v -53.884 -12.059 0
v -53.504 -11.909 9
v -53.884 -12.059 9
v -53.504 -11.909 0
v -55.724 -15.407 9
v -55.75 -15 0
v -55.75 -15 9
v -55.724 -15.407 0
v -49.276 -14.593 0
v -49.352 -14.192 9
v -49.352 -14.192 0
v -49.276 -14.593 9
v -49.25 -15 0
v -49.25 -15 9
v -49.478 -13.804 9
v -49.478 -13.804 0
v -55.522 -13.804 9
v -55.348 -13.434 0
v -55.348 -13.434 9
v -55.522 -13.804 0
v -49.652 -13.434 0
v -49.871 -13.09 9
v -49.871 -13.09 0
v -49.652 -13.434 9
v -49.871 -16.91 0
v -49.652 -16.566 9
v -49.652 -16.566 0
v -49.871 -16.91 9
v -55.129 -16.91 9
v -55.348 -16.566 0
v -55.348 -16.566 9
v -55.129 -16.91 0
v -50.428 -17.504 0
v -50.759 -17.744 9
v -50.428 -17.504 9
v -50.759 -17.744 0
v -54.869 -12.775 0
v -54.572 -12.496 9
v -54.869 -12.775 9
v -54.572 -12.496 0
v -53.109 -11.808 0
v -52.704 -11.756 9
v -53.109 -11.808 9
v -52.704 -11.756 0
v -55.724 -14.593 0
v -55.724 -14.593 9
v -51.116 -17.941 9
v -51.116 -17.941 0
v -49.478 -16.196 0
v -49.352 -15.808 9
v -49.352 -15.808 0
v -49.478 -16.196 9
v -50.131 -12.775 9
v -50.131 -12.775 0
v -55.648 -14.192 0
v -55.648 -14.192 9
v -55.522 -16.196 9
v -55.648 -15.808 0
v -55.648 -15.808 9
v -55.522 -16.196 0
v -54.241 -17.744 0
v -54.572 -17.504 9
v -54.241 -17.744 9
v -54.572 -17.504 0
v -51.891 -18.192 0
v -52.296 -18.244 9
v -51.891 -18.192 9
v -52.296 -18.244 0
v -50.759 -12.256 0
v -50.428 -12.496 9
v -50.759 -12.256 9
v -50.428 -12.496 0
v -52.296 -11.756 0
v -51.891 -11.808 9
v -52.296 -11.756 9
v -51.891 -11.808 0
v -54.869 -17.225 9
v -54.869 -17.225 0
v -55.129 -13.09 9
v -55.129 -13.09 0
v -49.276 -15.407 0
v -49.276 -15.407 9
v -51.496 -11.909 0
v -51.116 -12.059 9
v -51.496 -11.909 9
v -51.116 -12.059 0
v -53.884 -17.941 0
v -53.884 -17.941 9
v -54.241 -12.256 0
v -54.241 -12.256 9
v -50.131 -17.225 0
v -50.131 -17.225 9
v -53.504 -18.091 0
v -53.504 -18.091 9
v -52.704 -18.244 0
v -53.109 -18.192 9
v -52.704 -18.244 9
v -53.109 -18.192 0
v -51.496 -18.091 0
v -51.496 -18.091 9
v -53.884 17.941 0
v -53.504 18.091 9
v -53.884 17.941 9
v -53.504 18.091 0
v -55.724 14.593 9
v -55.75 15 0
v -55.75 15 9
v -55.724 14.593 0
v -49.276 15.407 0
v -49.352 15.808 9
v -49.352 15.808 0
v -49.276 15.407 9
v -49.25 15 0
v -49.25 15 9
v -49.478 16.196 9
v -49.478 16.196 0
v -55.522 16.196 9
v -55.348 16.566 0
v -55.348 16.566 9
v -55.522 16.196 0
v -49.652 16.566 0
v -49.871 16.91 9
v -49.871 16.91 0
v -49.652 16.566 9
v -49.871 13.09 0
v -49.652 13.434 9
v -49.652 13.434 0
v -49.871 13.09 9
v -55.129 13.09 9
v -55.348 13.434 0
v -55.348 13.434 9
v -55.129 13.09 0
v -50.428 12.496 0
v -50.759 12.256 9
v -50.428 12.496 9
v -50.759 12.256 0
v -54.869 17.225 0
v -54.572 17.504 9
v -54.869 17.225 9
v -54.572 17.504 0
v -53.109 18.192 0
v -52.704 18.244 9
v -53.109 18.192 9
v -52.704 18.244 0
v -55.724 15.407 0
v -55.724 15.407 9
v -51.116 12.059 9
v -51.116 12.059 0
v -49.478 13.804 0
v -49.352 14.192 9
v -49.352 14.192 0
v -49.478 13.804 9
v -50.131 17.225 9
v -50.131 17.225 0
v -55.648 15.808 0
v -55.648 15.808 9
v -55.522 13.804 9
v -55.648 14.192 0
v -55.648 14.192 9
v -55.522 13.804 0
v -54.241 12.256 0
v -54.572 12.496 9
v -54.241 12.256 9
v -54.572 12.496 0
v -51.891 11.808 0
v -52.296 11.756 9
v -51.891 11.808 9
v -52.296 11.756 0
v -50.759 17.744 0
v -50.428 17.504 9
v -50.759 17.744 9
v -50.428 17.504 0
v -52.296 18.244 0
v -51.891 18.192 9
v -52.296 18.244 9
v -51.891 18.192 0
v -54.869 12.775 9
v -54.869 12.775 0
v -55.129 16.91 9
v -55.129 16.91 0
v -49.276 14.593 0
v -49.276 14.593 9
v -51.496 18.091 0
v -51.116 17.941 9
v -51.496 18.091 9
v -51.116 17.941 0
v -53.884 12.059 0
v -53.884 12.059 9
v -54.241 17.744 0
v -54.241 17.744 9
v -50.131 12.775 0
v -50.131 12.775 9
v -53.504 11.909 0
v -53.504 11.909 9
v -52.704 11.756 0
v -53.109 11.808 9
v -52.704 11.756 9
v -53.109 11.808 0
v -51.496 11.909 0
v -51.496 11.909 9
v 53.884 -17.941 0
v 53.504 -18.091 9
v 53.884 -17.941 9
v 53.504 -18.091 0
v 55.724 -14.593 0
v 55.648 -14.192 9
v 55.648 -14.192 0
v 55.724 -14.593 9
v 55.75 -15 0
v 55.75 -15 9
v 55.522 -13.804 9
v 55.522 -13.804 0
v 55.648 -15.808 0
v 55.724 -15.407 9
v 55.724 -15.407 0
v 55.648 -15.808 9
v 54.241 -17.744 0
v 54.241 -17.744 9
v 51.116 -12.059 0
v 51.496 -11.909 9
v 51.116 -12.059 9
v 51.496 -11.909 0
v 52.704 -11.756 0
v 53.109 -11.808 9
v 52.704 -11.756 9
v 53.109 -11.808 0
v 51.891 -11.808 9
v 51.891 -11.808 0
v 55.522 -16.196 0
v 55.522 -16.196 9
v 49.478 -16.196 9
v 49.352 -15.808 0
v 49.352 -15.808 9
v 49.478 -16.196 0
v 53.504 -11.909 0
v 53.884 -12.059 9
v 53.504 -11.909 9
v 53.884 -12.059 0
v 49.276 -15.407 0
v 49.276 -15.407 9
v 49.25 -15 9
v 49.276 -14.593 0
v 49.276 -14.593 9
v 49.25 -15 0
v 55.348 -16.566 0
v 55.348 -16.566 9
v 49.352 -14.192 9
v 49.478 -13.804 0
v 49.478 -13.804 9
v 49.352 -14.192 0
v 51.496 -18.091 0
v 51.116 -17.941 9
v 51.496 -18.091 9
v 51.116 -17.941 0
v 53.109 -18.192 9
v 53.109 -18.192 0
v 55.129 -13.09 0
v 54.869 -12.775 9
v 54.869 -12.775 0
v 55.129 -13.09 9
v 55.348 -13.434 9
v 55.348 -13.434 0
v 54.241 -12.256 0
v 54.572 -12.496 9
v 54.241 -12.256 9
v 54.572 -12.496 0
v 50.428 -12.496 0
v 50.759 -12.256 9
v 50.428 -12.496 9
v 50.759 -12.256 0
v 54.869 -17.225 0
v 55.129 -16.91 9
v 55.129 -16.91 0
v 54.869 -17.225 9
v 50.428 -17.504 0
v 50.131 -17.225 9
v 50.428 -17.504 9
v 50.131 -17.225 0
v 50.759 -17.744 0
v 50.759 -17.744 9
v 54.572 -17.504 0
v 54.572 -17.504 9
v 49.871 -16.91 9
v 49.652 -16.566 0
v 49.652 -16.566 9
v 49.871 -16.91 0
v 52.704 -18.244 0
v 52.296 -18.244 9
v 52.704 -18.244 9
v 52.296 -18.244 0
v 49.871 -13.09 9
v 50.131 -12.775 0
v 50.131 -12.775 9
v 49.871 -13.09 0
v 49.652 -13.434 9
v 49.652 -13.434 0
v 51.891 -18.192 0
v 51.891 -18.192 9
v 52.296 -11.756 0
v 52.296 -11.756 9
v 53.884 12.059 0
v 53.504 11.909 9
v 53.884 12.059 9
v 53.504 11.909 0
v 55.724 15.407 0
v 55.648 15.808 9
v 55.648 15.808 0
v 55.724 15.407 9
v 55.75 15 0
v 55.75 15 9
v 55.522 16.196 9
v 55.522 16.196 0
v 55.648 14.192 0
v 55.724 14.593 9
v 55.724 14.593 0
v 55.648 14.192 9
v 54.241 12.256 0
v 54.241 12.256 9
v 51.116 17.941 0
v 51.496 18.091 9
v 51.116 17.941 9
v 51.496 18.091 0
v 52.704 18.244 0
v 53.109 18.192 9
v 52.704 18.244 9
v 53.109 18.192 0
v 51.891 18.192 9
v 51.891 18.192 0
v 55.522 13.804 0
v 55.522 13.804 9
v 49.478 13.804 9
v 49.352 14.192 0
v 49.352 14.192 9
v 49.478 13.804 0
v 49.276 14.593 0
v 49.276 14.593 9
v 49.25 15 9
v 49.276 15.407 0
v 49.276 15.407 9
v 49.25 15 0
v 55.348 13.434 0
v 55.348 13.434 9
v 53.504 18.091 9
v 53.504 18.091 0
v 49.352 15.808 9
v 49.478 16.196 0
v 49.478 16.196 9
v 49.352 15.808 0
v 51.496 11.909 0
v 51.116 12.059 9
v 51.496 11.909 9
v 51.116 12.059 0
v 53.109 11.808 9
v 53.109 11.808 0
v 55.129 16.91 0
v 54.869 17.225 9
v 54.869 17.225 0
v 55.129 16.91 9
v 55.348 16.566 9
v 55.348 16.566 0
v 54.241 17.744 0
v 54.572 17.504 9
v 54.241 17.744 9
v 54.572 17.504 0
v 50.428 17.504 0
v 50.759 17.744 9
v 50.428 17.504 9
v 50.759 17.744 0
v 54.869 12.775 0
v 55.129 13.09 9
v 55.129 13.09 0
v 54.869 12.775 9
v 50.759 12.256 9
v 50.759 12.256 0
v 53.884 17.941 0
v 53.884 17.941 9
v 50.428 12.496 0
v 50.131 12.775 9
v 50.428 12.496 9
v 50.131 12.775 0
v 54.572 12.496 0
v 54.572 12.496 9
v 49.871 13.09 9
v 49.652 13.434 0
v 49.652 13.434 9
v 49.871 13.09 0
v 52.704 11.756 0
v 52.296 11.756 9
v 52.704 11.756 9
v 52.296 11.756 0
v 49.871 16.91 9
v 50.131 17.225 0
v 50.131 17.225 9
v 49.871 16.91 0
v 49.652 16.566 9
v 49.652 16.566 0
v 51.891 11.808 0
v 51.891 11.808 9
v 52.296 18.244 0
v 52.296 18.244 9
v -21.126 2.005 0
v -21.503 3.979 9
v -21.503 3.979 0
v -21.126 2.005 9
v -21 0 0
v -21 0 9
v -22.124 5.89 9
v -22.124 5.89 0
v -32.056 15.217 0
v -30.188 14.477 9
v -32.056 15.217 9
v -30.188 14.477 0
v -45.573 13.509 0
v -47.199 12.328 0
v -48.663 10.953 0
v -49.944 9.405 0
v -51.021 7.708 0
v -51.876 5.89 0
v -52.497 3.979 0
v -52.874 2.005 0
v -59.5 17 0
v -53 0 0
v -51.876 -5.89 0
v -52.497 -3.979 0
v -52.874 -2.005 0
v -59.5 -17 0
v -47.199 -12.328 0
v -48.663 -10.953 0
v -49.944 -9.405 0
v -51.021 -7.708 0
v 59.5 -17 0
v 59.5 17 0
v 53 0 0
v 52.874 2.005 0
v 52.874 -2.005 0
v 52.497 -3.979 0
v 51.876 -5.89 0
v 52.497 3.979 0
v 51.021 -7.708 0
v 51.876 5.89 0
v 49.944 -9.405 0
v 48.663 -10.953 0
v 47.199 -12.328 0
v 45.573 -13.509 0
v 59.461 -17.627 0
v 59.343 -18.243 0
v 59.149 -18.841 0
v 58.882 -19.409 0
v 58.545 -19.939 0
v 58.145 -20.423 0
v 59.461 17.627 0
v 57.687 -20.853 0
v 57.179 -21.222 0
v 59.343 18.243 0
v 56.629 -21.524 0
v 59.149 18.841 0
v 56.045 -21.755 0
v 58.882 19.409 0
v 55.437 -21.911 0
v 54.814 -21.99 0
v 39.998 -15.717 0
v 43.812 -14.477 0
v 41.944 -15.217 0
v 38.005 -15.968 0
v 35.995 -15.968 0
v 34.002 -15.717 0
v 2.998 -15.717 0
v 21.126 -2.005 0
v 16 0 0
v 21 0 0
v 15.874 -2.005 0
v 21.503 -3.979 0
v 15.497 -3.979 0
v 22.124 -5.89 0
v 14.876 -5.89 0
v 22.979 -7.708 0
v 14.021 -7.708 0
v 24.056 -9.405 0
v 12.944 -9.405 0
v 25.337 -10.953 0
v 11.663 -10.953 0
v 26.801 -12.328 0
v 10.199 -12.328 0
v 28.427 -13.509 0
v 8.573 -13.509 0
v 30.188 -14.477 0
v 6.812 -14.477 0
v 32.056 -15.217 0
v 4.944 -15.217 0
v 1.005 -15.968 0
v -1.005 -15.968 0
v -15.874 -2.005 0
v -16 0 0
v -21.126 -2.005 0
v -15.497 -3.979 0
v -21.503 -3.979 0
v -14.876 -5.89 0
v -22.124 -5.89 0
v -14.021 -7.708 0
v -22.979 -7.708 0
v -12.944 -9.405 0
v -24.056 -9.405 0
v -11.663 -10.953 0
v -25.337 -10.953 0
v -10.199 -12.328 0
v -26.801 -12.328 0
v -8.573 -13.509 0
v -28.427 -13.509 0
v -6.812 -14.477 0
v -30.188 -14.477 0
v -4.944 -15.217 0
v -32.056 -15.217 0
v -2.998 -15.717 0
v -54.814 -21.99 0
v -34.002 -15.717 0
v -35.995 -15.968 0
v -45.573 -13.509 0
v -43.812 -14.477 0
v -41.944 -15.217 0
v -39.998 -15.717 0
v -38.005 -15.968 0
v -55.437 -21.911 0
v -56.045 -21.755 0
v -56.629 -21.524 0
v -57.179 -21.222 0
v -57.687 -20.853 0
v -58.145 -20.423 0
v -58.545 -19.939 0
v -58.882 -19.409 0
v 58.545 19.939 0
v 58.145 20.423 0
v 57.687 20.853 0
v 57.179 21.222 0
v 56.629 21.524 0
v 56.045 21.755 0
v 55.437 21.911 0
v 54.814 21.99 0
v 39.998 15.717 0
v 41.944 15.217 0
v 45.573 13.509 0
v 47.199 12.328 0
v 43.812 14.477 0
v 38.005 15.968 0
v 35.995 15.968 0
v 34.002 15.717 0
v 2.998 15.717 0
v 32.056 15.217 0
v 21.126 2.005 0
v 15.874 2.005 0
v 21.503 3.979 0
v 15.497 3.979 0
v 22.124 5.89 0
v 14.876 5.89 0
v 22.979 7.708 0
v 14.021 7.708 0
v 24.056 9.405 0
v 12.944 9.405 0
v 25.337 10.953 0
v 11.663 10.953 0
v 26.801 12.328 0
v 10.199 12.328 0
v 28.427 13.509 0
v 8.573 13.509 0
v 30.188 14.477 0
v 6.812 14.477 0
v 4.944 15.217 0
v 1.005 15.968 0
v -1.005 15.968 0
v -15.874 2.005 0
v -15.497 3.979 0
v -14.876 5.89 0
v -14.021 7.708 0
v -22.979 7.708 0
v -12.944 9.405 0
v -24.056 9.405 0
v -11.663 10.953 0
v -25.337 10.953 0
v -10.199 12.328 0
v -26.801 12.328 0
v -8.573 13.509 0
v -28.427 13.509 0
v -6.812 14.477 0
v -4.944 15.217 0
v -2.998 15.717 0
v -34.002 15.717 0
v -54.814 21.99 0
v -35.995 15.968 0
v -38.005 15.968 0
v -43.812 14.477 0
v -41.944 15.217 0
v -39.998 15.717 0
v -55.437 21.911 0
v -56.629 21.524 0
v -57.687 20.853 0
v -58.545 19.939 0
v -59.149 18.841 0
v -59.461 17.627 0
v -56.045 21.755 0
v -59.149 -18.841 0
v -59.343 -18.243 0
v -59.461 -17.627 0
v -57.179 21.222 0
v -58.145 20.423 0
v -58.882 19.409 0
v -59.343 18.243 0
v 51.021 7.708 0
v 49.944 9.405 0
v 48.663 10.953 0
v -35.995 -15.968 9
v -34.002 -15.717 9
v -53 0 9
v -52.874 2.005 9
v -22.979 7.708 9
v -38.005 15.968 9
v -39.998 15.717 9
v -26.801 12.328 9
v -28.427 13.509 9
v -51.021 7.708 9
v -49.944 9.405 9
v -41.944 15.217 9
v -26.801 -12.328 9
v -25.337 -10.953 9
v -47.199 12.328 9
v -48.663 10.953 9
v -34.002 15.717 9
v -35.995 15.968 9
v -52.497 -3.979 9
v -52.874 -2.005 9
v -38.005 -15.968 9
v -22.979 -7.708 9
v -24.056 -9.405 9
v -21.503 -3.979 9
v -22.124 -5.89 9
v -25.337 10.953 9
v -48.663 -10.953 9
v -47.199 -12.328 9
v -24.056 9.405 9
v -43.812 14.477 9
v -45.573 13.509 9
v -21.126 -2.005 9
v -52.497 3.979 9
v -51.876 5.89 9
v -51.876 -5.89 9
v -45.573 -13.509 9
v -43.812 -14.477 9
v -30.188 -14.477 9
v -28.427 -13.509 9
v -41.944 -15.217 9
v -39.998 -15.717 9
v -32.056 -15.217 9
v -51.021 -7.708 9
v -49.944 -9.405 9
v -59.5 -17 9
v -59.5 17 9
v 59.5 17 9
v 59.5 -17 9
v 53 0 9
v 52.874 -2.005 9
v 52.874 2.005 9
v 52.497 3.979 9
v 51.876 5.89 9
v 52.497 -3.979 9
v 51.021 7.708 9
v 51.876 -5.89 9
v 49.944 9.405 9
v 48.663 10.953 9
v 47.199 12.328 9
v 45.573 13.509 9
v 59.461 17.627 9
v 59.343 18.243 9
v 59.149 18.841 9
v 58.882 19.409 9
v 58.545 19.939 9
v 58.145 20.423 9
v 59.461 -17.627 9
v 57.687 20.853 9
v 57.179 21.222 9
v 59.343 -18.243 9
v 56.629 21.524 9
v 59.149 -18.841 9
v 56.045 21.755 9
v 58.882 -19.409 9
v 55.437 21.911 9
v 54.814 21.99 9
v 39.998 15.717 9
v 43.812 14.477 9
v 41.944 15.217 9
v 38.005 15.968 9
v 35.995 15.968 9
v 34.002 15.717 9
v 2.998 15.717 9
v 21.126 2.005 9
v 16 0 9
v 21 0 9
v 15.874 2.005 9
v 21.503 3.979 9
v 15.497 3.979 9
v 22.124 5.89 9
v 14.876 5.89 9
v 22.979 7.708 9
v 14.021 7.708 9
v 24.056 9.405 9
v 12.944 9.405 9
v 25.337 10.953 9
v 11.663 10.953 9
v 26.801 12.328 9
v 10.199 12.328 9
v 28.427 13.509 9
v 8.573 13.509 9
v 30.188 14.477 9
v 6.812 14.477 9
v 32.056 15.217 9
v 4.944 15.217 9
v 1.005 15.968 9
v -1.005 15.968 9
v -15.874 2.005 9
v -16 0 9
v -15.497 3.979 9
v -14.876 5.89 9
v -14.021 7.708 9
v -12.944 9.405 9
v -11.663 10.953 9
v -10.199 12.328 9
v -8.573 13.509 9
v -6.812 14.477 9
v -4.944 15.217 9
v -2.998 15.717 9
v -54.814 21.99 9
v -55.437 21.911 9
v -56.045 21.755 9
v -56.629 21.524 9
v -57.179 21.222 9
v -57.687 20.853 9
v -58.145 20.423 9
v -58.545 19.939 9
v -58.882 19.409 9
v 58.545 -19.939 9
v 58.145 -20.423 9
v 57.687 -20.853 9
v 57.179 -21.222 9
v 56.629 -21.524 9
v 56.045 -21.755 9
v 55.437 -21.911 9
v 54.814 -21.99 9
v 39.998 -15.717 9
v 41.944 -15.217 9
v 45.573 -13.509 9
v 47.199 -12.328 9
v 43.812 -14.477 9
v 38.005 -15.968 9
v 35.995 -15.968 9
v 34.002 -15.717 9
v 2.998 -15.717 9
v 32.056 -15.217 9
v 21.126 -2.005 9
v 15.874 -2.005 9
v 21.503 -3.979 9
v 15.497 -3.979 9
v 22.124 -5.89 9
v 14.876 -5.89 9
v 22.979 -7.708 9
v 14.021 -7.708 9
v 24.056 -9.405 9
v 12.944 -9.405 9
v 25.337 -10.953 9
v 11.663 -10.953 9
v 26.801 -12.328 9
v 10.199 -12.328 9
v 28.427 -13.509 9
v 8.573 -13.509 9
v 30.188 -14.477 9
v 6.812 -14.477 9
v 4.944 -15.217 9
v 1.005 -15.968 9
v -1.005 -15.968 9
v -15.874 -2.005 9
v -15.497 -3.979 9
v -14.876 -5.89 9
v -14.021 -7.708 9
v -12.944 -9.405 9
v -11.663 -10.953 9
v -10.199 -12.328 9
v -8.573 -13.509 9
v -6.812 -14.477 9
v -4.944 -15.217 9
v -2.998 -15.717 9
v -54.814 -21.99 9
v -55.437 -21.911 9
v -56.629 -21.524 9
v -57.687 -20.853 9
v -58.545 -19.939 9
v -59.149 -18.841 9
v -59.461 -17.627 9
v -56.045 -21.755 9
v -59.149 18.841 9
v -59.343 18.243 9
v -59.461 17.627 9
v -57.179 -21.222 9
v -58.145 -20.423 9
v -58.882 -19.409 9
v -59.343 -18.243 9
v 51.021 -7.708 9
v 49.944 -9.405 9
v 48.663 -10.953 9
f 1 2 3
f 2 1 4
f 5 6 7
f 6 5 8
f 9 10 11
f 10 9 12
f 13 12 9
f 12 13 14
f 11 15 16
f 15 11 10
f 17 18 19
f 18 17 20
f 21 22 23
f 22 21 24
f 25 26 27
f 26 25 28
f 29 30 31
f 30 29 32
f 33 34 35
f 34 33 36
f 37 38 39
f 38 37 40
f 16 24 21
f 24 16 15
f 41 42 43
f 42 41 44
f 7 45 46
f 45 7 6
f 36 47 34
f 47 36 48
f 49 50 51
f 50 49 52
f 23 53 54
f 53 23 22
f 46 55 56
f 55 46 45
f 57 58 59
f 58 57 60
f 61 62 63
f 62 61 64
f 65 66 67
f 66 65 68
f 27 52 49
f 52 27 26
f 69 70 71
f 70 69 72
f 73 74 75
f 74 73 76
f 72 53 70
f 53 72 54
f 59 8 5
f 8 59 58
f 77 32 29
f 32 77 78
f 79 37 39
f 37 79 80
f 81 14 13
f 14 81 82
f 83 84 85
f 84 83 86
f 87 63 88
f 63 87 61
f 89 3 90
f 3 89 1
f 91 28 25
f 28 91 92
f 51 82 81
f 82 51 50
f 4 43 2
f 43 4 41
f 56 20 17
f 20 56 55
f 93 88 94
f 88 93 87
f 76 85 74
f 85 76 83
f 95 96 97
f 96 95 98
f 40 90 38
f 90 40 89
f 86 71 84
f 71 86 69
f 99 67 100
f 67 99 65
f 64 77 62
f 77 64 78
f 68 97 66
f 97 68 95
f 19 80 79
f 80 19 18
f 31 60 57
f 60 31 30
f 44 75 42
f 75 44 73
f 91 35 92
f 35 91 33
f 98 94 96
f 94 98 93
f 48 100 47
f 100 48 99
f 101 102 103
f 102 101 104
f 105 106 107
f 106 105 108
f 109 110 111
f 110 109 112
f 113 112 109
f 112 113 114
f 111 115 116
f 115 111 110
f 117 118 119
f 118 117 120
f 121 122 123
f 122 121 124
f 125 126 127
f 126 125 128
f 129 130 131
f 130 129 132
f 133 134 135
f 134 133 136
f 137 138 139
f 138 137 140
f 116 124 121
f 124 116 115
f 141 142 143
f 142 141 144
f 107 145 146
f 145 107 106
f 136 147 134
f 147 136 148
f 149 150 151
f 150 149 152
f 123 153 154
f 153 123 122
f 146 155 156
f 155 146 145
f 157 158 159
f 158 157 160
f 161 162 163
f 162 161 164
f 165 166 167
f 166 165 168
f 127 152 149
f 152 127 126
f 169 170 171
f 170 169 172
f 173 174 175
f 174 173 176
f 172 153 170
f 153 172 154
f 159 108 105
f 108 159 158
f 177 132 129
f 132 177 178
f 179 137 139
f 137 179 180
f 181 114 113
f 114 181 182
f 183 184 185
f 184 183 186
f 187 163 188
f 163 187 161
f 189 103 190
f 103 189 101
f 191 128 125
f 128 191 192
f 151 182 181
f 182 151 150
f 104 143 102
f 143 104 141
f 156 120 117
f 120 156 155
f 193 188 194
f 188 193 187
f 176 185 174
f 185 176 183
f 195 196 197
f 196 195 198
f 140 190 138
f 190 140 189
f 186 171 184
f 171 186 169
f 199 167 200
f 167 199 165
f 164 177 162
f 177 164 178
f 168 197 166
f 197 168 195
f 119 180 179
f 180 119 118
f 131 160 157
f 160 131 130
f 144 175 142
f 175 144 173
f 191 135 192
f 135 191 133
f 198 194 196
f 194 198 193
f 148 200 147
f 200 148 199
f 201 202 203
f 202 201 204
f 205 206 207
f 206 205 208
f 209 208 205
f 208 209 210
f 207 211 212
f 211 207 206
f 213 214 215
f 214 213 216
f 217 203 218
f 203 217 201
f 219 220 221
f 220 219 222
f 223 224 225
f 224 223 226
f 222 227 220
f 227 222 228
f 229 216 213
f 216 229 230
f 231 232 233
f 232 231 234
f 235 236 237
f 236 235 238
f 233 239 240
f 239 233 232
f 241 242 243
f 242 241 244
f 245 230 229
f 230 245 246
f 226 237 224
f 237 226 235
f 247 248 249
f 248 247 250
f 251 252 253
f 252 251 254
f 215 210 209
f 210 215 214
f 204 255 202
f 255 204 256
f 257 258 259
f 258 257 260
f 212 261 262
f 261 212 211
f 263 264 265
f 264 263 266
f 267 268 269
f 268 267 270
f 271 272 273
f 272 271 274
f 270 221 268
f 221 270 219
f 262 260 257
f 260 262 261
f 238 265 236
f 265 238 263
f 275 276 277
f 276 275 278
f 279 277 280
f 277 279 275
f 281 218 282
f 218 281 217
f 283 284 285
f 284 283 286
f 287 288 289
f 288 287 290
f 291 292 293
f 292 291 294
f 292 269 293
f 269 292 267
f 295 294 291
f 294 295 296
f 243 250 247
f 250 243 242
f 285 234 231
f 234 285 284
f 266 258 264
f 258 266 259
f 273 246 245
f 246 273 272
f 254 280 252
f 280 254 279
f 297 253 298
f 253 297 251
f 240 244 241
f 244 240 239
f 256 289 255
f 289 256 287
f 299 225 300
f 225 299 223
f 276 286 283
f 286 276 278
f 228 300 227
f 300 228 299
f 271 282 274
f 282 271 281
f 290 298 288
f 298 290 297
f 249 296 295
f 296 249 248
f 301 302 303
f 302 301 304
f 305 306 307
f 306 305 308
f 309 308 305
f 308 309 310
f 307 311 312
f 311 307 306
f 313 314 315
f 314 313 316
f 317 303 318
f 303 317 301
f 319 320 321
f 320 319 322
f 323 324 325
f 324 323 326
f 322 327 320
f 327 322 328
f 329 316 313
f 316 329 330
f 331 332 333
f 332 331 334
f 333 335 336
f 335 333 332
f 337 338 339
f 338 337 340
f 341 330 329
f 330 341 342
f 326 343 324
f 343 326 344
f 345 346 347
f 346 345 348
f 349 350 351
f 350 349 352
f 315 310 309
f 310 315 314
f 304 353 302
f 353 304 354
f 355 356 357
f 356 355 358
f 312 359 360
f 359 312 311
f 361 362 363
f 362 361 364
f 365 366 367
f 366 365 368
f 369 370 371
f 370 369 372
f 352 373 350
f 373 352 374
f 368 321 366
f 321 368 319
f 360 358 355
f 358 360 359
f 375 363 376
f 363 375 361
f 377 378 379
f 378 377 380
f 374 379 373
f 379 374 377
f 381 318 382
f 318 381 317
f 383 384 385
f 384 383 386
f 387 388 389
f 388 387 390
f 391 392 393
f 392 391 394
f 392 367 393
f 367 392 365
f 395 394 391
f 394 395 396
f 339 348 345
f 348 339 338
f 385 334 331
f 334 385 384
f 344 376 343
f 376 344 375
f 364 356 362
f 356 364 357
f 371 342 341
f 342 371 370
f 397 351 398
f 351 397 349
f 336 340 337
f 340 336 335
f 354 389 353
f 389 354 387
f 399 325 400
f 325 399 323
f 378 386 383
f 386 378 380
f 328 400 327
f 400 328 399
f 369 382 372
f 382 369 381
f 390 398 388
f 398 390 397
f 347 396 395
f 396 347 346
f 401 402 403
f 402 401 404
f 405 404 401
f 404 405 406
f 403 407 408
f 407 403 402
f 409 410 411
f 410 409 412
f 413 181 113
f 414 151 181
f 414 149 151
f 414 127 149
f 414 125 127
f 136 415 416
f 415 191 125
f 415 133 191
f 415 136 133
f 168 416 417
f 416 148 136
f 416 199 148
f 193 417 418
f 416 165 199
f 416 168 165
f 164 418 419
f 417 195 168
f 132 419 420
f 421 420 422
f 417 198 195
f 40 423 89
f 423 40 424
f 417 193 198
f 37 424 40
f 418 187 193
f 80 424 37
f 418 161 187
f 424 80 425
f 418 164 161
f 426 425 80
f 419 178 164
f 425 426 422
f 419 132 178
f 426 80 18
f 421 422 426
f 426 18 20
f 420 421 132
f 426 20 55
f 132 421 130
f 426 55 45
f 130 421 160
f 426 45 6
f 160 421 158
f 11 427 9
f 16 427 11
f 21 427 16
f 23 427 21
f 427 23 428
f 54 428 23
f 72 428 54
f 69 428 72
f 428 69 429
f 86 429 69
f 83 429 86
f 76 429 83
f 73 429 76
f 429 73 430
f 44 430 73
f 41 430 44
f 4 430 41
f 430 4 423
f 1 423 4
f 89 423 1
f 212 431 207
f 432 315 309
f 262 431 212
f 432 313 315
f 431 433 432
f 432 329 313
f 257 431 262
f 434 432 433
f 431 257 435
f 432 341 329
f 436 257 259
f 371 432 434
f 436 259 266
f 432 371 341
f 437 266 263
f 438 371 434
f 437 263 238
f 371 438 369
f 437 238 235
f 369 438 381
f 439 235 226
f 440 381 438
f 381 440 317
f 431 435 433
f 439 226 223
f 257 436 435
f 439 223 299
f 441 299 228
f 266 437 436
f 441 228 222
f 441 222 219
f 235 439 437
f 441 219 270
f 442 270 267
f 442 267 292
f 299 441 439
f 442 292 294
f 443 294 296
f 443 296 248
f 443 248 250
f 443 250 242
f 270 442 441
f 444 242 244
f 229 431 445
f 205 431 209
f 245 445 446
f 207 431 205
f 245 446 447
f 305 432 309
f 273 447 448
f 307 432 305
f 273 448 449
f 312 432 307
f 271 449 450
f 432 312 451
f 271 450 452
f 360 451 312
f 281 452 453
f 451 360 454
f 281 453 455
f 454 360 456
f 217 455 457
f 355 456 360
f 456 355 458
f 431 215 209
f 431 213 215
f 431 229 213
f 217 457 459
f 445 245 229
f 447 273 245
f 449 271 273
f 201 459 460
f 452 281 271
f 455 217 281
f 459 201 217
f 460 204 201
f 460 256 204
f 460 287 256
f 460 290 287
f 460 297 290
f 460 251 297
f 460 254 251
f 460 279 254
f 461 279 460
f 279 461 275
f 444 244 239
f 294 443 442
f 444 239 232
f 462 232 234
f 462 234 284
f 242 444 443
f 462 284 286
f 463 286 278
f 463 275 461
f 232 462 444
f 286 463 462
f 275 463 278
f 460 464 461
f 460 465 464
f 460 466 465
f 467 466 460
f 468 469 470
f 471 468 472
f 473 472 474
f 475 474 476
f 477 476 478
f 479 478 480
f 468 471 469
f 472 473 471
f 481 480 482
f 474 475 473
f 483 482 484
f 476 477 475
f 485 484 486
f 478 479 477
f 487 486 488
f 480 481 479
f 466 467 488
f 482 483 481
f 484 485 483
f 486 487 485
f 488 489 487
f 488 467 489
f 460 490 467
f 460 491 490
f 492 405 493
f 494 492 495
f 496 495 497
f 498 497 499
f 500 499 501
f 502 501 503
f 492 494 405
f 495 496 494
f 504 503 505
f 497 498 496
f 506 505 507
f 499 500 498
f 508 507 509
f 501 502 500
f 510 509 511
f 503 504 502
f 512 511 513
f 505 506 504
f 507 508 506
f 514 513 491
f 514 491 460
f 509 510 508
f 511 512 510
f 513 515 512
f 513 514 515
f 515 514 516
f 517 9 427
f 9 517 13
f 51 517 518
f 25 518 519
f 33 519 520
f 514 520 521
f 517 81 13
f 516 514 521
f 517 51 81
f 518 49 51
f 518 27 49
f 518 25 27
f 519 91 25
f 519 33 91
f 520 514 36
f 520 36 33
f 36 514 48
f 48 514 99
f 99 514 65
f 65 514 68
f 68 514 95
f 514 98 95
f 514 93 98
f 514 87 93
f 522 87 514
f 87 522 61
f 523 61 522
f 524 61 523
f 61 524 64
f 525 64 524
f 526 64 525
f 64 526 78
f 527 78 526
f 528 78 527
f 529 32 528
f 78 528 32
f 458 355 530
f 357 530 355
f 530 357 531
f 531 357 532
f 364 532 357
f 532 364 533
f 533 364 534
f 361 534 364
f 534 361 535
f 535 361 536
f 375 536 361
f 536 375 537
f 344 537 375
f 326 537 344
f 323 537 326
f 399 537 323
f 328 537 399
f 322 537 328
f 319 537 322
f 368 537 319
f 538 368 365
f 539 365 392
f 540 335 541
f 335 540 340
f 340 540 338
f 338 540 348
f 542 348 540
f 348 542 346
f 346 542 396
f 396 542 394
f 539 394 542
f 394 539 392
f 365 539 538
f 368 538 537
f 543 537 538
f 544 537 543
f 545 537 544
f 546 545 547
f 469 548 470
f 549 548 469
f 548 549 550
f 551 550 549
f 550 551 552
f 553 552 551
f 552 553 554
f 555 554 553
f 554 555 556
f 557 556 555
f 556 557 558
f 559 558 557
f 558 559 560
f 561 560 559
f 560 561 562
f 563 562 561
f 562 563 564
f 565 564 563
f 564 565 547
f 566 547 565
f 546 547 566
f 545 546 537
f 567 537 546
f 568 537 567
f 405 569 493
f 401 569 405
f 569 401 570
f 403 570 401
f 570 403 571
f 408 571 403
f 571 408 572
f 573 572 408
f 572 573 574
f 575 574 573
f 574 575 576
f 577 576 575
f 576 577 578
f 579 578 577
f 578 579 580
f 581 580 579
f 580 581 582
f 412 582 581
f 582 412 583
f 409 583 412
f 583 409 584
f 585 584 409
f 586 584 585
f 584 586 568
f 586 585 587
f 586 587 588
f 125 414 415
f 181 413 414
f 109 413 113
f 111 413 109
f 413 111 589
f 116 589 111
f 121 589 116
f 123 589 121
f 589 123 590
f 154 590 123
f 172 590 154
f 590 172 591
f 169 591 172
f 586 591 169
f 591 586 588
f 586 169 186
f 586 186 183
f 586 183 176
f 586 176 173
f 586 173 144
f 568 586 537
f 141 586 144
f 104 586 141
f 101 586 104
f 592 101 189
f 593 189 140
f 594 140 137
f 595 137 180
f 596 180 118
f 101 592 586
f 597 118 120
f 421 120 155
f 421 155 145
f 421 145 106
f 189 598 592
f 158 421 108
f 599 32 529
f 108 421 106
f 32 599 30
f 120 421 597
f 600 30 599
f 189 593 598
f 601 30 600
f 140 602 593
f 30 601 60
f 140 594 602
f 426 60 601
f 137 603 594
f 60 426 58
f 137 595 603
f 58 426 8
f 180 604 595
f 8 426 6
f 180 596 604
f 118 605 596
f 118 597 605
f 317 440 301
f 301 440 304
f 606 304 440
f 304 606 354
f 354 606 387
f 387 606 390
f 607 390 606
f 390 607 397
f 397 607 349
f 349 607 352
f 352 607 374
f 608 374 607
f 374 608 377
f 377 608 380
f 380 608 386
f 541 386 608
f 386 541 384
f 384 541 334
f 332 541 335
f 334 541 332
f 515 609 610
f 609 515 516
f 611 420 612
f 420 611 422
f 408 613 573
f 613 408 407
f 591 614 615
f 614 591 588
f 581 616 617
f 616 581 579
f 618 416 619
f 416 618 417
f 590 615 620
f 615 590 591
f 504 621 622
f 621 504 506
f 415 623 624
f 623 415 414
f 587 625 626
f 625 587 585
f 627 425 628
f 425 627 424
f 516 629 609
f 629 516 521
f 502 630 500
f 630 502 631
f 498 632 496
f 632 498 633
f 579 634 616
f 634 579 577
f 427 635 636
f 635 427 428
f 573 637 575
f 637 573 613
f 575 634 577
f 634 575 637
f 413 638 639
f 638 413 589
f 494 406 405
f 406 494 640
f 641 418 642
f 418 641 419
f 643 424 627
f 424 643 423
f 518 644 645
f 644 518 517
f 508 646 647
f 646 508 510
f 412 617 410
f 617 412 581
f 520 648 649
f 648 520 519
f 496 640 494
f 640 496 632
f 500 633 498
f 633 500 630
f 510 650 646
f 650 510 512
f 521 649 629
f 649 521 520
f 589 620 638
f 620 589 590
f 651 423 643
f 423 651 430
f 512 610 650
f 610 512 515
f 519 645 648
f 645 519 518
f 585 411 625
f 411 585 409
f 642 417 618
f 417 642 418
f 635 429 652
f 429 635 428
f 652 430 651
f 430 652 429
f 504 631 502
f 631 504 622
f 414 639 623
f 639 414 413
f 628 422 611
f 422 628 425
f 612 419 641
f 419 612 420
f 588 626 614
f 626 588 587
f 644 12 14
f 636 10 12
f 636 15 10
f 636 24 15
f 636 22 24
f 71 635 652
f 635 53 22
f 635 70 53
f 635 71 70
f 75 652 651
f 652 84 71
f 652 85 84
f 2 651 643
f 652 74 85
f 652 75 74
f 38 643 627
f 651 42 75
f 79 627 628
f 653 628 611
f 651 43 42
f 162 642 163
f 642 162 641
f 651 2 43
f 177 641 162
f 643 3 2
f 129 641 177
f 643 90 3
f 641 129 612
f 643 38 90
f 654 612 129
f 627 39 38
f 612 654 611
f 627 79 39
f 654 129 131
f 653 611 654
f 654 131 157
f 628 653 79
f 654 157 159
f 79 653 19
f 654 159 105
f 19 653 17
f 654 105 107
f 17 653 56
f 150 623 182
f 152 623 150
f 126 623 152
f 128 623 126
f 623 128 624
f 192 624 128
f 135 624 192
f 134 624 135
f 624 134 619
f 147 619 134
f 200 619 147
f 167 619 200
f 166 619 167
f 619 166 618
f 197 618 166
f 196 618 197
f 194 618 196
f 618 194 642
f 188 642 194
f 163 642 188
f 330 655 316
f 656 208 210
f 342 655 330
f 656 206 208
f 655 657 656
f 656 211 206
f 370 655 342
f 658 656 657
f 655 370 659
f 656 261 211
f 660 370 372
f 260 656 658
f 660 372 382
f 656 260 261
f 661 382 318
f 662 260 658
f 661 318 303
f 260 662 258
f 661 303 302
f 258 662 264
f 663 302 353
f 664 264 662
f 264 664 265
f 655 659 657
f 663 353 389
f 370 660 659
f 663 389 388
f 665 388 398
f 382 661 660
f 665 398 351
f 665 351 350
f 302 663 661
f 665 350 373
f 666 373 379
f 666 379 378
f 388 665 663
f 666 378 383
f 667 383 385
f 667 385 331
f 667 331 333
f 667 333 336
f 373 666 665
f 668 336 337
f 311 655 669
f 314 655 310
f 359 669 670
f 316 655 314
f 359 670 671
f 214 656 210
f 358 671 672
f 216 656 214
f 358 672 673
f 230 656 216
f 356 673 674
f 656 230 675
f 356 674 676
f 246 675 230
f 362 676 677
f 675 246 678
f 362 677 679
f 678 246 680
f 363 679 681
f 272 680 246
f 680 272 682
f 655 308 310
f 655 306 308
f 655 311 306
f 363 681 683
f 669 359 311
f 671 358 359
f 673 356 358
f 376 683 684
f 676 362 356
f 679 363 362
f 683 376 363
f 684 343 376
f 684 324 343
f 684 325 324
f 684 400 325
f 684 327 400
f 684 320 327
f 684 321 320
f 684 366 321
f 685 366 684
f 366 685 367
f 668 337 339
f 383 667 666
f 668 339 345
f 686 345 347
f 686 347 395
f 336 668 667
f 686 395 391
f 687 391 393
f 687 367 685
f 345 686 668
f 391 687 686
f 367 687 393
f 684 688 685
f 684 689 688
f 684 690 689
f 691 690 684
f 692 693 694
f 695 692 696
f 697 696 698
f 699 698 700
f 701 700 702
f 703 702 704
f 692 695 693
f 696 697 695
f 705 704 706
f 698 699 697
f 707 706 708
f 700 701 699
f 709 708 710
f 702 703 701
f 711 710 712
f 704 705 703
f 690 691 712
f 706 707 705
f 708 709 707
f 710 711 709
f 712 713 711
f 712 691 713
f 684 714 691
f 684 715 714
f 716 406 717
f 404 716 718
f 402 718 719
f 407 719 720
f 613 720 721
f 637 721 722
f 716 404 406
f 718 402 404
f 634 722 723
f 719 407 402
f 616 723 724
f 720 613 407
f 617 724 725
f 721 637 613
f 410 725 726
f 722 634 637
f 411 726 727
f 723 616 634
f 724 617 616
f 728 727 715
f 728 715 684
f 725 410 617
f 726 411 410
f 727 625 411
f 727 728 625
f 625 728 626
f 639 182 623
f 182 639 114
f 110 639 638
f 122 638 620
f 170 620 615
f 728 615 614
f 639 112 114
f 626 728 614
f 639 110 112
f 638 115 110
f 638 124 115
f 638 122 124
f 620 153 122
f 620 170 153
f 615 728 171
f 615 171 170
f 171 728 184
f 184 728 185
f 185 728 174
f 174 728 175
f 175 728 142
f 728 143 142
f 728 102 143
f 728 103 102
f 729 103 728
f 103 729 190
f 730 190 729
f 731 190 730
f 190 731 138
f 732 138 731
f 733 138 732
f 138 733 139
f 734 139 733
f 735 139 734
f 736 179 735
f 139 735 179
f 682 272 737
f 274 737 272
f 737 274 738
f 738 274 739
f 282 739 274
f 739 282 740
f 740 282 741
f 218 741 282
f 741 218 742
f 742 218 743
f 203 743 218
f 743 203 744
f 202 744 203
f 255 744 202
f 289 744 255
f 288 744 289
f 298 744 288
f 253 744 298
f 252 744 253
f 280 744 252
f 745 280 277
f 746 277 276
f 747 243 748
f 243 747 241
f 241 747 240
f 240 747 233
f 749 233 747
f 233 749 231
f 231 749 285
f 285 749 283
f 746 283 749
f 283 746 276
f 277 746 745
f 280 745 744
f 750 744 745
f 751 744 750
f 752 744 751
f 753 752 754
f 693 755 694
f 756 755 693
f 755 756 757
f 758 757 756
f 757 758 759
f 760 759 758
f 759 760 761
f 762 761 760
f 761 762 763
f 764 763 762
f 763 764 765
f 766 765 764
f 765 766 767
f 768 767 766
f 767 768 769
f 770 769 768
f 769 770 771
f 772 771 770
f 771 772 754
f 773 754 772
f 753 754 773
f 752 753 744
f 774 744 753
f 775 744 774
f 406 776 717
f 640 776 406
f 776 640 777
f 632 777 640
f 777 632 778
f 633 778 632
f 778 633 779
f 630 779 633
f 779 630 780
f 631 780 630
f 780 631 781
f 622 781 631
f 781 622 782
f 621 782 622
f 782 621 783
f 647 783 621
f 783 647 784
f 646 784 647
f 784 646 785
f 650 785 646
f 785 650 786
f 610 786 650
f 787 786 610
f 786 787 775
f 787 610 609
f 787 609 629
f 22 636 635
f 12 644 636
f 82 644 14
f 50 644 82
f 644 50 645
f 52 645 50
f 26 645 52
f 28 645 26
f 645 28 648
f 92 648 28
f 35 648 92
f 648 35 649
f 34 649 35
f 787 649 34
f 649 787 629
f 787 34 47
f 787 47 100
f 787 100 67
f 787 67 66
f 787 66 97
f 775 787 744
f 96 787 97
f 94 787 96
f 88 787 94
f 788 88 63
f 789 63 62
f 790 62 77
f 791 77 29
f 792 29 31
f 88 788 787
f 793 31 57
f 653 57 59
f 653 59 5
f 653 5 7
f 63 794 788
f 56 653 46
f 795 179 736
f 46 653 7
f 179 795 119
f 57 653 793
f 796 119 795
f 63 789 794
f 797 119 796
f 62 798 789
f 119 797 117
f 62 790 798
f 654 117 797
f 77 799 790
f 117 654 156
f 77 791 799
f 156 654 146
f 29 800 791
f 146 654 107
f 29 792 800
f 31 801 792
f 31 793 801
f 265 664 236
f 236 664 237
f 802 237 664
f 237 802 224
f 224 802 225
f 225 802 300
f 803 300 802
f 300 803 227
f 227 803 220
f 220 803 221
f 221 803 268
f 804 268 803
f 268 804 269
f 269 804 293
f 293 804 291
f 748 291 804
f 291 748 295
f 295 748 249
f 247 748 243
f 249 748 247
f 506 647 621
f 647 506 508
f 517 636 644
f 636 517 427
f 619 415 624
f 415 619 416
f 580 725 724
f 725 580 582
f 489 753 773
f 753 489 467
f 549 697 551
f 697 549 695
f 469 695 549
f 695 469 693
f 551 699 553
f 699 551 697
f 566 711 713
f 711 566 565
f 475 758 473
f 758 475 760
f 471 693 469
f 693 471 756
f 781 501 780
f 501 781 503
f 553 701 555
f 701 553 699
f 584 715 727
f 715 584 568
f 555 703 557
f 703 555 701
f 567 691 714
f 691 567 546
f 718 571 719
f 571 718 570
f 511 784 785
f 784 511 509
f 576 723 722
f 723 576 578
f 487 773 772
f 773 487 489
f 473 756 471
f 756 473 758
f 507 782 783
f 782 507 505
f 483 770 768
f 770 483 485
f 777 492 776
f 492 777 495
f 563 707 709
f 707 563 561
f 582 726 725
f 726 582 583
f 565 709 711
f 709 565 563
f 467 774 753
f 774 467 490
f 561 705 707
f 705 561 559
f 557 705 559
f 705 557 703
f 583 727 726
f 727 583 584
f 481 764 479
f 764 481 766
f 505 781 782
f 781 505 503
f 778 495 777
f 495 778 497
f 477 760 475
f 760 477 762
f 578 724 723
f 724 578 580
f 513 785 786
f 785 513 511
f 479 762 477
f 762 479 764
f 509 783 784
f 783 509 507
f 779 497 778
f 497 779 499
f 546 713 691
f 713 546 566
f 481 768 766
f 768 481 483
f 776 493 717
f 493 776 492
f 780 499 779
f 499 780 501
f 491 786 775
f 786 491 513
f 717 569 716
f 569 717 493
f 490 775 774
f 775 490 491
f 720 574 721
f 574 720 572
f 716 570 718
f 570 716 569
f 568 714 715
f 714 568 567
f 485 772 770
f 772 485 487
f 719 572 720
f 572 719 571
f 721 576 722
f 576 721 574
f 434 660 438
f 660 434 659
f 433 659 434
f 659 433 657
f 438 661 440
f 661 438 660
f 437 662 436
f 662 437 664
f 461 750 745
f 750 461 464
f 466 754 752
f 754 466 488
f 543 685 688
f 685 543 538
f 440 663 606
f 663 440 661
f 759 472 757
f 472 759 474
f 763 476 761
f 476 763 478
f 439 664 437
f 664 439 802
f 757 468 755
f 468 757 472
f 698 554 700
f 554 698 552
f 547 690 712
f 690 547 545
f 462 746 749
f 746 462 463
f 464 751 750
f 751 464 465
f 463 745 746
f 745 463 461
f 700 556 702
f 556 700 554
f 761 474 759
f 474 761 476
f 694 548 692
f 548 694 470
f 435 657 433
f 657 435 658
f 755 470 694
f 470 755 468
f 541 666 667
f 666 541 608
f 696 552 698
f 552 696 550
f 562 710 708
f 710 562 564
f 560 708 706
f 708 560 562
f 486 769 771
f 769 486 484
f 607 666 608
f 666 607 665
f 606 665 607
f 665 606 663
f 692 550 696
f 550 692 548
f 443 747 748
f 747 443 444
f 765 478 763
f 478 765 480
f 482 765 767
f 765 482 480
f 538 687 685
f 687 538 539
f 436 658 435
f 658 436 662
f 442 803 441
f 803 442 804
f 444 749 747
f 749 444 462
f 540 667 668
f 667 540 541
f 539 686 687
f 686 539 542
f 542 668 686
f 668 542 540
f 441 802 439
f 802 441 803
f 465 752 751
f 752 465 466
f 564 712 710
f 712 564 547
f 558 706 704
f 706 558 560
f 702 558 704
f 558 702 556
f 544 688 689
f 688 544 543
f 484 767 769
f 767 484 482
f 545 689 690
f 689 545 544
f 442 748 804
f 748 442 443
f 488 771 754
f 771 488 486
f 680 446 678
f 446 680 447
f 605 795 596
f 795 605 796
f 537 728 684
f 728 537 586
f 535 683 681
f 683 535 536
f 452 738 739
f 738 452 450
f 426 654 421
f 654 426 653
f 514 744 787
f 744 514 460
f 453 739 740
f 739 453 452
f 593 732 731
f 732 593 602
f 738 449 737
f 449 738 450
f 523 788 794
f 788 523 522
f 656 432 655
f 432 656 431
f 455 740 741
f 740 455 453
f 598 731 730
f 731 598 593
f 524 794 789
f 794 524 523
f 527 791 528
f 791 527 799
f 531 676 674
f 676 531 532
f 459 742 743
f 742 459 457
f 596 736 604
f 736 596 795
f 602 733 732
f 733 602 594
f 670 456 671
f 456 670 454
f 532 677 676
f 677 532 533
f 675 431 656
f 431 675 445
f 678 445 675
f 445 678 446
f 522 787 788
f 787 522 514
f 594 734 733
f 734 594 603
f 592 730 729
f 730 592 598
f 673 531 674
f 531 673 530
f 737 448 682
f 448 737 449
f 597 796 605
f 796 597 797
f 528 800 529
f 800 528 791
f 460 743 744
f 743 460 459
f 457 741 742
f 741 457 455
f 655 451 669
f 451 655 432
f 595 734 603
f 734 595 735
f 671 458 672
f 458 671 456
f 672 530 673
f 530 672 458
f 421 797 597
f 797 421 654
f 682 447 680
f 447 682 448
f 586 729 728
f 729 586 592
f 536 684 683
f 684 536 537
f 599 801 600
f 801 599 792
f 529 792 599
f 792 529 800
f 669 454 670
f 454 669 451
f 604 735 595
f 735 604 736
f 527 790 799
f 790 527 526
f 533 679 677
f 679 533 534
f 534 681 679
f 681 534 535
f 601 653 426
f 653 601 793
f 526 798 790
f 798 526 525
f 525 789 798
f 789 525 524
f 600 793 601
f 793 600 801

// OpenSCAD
$fn = 50;

difference() {
	union() {
		hull() {
			translate(v = [-54.5, 17.0, 0]) {
				cylinder(h = 9, r = 5);
			}
			translate(v = [54.5, 17.0, 0]) {
				cylinder(h = 9, r = 5);
			}
			translate(v = [-54.5, -17.0, 0]) {
				cylinder(h = 9, r = 5);
			}
			translate(v = [54.5, -17.0, 0]) {
				cylinder(h = 9, r = 5);
			}
		}
	}
	union() {
		translate(v = [-52.5, -15.0, -100.0]) {
			cylinder(h = 200, r = 3.25);
		}
		translate(v = [-52.5, 15.0, -100.0]) {
			cylinder(h = 200, r = 3.25);
		}
		translate(v = [52.5, -15.0, -100.0]) {
			cylinder(h = 200, r = 3.25);
		}
		translate(v = [52.5, 15.0, -100.0]) {
			cylinder(h = 200, r = 3.25);
		}
		translate(v = [-52.5, -15.0, -100.0]) {
			cylinder(h = 200, r = 1.8);
		}
		translate(v = [-52.5, 15.0, -100.0]) {
			cylinder(h = 200, r = 1.8);
		}
		translate(v = [52.5, -15.0, -100.0]) {
			cylinder(h = 200, r = 1.8);
		}
		translate(v = [52.5, 15.0, -100.0]) {
			cylinder(h = 200, r = 1.8);
		}
		translate(v = [-37.0, 0, 0.0]) {
			cylinder(h = 9, r = 16.0);
		}
		cylinder(h = 9, r = 16.0);
		translate(v = [37.0, 0, 0.0]) {
			cylinder(h = 9, r = 16.0);
		}
	}
}
